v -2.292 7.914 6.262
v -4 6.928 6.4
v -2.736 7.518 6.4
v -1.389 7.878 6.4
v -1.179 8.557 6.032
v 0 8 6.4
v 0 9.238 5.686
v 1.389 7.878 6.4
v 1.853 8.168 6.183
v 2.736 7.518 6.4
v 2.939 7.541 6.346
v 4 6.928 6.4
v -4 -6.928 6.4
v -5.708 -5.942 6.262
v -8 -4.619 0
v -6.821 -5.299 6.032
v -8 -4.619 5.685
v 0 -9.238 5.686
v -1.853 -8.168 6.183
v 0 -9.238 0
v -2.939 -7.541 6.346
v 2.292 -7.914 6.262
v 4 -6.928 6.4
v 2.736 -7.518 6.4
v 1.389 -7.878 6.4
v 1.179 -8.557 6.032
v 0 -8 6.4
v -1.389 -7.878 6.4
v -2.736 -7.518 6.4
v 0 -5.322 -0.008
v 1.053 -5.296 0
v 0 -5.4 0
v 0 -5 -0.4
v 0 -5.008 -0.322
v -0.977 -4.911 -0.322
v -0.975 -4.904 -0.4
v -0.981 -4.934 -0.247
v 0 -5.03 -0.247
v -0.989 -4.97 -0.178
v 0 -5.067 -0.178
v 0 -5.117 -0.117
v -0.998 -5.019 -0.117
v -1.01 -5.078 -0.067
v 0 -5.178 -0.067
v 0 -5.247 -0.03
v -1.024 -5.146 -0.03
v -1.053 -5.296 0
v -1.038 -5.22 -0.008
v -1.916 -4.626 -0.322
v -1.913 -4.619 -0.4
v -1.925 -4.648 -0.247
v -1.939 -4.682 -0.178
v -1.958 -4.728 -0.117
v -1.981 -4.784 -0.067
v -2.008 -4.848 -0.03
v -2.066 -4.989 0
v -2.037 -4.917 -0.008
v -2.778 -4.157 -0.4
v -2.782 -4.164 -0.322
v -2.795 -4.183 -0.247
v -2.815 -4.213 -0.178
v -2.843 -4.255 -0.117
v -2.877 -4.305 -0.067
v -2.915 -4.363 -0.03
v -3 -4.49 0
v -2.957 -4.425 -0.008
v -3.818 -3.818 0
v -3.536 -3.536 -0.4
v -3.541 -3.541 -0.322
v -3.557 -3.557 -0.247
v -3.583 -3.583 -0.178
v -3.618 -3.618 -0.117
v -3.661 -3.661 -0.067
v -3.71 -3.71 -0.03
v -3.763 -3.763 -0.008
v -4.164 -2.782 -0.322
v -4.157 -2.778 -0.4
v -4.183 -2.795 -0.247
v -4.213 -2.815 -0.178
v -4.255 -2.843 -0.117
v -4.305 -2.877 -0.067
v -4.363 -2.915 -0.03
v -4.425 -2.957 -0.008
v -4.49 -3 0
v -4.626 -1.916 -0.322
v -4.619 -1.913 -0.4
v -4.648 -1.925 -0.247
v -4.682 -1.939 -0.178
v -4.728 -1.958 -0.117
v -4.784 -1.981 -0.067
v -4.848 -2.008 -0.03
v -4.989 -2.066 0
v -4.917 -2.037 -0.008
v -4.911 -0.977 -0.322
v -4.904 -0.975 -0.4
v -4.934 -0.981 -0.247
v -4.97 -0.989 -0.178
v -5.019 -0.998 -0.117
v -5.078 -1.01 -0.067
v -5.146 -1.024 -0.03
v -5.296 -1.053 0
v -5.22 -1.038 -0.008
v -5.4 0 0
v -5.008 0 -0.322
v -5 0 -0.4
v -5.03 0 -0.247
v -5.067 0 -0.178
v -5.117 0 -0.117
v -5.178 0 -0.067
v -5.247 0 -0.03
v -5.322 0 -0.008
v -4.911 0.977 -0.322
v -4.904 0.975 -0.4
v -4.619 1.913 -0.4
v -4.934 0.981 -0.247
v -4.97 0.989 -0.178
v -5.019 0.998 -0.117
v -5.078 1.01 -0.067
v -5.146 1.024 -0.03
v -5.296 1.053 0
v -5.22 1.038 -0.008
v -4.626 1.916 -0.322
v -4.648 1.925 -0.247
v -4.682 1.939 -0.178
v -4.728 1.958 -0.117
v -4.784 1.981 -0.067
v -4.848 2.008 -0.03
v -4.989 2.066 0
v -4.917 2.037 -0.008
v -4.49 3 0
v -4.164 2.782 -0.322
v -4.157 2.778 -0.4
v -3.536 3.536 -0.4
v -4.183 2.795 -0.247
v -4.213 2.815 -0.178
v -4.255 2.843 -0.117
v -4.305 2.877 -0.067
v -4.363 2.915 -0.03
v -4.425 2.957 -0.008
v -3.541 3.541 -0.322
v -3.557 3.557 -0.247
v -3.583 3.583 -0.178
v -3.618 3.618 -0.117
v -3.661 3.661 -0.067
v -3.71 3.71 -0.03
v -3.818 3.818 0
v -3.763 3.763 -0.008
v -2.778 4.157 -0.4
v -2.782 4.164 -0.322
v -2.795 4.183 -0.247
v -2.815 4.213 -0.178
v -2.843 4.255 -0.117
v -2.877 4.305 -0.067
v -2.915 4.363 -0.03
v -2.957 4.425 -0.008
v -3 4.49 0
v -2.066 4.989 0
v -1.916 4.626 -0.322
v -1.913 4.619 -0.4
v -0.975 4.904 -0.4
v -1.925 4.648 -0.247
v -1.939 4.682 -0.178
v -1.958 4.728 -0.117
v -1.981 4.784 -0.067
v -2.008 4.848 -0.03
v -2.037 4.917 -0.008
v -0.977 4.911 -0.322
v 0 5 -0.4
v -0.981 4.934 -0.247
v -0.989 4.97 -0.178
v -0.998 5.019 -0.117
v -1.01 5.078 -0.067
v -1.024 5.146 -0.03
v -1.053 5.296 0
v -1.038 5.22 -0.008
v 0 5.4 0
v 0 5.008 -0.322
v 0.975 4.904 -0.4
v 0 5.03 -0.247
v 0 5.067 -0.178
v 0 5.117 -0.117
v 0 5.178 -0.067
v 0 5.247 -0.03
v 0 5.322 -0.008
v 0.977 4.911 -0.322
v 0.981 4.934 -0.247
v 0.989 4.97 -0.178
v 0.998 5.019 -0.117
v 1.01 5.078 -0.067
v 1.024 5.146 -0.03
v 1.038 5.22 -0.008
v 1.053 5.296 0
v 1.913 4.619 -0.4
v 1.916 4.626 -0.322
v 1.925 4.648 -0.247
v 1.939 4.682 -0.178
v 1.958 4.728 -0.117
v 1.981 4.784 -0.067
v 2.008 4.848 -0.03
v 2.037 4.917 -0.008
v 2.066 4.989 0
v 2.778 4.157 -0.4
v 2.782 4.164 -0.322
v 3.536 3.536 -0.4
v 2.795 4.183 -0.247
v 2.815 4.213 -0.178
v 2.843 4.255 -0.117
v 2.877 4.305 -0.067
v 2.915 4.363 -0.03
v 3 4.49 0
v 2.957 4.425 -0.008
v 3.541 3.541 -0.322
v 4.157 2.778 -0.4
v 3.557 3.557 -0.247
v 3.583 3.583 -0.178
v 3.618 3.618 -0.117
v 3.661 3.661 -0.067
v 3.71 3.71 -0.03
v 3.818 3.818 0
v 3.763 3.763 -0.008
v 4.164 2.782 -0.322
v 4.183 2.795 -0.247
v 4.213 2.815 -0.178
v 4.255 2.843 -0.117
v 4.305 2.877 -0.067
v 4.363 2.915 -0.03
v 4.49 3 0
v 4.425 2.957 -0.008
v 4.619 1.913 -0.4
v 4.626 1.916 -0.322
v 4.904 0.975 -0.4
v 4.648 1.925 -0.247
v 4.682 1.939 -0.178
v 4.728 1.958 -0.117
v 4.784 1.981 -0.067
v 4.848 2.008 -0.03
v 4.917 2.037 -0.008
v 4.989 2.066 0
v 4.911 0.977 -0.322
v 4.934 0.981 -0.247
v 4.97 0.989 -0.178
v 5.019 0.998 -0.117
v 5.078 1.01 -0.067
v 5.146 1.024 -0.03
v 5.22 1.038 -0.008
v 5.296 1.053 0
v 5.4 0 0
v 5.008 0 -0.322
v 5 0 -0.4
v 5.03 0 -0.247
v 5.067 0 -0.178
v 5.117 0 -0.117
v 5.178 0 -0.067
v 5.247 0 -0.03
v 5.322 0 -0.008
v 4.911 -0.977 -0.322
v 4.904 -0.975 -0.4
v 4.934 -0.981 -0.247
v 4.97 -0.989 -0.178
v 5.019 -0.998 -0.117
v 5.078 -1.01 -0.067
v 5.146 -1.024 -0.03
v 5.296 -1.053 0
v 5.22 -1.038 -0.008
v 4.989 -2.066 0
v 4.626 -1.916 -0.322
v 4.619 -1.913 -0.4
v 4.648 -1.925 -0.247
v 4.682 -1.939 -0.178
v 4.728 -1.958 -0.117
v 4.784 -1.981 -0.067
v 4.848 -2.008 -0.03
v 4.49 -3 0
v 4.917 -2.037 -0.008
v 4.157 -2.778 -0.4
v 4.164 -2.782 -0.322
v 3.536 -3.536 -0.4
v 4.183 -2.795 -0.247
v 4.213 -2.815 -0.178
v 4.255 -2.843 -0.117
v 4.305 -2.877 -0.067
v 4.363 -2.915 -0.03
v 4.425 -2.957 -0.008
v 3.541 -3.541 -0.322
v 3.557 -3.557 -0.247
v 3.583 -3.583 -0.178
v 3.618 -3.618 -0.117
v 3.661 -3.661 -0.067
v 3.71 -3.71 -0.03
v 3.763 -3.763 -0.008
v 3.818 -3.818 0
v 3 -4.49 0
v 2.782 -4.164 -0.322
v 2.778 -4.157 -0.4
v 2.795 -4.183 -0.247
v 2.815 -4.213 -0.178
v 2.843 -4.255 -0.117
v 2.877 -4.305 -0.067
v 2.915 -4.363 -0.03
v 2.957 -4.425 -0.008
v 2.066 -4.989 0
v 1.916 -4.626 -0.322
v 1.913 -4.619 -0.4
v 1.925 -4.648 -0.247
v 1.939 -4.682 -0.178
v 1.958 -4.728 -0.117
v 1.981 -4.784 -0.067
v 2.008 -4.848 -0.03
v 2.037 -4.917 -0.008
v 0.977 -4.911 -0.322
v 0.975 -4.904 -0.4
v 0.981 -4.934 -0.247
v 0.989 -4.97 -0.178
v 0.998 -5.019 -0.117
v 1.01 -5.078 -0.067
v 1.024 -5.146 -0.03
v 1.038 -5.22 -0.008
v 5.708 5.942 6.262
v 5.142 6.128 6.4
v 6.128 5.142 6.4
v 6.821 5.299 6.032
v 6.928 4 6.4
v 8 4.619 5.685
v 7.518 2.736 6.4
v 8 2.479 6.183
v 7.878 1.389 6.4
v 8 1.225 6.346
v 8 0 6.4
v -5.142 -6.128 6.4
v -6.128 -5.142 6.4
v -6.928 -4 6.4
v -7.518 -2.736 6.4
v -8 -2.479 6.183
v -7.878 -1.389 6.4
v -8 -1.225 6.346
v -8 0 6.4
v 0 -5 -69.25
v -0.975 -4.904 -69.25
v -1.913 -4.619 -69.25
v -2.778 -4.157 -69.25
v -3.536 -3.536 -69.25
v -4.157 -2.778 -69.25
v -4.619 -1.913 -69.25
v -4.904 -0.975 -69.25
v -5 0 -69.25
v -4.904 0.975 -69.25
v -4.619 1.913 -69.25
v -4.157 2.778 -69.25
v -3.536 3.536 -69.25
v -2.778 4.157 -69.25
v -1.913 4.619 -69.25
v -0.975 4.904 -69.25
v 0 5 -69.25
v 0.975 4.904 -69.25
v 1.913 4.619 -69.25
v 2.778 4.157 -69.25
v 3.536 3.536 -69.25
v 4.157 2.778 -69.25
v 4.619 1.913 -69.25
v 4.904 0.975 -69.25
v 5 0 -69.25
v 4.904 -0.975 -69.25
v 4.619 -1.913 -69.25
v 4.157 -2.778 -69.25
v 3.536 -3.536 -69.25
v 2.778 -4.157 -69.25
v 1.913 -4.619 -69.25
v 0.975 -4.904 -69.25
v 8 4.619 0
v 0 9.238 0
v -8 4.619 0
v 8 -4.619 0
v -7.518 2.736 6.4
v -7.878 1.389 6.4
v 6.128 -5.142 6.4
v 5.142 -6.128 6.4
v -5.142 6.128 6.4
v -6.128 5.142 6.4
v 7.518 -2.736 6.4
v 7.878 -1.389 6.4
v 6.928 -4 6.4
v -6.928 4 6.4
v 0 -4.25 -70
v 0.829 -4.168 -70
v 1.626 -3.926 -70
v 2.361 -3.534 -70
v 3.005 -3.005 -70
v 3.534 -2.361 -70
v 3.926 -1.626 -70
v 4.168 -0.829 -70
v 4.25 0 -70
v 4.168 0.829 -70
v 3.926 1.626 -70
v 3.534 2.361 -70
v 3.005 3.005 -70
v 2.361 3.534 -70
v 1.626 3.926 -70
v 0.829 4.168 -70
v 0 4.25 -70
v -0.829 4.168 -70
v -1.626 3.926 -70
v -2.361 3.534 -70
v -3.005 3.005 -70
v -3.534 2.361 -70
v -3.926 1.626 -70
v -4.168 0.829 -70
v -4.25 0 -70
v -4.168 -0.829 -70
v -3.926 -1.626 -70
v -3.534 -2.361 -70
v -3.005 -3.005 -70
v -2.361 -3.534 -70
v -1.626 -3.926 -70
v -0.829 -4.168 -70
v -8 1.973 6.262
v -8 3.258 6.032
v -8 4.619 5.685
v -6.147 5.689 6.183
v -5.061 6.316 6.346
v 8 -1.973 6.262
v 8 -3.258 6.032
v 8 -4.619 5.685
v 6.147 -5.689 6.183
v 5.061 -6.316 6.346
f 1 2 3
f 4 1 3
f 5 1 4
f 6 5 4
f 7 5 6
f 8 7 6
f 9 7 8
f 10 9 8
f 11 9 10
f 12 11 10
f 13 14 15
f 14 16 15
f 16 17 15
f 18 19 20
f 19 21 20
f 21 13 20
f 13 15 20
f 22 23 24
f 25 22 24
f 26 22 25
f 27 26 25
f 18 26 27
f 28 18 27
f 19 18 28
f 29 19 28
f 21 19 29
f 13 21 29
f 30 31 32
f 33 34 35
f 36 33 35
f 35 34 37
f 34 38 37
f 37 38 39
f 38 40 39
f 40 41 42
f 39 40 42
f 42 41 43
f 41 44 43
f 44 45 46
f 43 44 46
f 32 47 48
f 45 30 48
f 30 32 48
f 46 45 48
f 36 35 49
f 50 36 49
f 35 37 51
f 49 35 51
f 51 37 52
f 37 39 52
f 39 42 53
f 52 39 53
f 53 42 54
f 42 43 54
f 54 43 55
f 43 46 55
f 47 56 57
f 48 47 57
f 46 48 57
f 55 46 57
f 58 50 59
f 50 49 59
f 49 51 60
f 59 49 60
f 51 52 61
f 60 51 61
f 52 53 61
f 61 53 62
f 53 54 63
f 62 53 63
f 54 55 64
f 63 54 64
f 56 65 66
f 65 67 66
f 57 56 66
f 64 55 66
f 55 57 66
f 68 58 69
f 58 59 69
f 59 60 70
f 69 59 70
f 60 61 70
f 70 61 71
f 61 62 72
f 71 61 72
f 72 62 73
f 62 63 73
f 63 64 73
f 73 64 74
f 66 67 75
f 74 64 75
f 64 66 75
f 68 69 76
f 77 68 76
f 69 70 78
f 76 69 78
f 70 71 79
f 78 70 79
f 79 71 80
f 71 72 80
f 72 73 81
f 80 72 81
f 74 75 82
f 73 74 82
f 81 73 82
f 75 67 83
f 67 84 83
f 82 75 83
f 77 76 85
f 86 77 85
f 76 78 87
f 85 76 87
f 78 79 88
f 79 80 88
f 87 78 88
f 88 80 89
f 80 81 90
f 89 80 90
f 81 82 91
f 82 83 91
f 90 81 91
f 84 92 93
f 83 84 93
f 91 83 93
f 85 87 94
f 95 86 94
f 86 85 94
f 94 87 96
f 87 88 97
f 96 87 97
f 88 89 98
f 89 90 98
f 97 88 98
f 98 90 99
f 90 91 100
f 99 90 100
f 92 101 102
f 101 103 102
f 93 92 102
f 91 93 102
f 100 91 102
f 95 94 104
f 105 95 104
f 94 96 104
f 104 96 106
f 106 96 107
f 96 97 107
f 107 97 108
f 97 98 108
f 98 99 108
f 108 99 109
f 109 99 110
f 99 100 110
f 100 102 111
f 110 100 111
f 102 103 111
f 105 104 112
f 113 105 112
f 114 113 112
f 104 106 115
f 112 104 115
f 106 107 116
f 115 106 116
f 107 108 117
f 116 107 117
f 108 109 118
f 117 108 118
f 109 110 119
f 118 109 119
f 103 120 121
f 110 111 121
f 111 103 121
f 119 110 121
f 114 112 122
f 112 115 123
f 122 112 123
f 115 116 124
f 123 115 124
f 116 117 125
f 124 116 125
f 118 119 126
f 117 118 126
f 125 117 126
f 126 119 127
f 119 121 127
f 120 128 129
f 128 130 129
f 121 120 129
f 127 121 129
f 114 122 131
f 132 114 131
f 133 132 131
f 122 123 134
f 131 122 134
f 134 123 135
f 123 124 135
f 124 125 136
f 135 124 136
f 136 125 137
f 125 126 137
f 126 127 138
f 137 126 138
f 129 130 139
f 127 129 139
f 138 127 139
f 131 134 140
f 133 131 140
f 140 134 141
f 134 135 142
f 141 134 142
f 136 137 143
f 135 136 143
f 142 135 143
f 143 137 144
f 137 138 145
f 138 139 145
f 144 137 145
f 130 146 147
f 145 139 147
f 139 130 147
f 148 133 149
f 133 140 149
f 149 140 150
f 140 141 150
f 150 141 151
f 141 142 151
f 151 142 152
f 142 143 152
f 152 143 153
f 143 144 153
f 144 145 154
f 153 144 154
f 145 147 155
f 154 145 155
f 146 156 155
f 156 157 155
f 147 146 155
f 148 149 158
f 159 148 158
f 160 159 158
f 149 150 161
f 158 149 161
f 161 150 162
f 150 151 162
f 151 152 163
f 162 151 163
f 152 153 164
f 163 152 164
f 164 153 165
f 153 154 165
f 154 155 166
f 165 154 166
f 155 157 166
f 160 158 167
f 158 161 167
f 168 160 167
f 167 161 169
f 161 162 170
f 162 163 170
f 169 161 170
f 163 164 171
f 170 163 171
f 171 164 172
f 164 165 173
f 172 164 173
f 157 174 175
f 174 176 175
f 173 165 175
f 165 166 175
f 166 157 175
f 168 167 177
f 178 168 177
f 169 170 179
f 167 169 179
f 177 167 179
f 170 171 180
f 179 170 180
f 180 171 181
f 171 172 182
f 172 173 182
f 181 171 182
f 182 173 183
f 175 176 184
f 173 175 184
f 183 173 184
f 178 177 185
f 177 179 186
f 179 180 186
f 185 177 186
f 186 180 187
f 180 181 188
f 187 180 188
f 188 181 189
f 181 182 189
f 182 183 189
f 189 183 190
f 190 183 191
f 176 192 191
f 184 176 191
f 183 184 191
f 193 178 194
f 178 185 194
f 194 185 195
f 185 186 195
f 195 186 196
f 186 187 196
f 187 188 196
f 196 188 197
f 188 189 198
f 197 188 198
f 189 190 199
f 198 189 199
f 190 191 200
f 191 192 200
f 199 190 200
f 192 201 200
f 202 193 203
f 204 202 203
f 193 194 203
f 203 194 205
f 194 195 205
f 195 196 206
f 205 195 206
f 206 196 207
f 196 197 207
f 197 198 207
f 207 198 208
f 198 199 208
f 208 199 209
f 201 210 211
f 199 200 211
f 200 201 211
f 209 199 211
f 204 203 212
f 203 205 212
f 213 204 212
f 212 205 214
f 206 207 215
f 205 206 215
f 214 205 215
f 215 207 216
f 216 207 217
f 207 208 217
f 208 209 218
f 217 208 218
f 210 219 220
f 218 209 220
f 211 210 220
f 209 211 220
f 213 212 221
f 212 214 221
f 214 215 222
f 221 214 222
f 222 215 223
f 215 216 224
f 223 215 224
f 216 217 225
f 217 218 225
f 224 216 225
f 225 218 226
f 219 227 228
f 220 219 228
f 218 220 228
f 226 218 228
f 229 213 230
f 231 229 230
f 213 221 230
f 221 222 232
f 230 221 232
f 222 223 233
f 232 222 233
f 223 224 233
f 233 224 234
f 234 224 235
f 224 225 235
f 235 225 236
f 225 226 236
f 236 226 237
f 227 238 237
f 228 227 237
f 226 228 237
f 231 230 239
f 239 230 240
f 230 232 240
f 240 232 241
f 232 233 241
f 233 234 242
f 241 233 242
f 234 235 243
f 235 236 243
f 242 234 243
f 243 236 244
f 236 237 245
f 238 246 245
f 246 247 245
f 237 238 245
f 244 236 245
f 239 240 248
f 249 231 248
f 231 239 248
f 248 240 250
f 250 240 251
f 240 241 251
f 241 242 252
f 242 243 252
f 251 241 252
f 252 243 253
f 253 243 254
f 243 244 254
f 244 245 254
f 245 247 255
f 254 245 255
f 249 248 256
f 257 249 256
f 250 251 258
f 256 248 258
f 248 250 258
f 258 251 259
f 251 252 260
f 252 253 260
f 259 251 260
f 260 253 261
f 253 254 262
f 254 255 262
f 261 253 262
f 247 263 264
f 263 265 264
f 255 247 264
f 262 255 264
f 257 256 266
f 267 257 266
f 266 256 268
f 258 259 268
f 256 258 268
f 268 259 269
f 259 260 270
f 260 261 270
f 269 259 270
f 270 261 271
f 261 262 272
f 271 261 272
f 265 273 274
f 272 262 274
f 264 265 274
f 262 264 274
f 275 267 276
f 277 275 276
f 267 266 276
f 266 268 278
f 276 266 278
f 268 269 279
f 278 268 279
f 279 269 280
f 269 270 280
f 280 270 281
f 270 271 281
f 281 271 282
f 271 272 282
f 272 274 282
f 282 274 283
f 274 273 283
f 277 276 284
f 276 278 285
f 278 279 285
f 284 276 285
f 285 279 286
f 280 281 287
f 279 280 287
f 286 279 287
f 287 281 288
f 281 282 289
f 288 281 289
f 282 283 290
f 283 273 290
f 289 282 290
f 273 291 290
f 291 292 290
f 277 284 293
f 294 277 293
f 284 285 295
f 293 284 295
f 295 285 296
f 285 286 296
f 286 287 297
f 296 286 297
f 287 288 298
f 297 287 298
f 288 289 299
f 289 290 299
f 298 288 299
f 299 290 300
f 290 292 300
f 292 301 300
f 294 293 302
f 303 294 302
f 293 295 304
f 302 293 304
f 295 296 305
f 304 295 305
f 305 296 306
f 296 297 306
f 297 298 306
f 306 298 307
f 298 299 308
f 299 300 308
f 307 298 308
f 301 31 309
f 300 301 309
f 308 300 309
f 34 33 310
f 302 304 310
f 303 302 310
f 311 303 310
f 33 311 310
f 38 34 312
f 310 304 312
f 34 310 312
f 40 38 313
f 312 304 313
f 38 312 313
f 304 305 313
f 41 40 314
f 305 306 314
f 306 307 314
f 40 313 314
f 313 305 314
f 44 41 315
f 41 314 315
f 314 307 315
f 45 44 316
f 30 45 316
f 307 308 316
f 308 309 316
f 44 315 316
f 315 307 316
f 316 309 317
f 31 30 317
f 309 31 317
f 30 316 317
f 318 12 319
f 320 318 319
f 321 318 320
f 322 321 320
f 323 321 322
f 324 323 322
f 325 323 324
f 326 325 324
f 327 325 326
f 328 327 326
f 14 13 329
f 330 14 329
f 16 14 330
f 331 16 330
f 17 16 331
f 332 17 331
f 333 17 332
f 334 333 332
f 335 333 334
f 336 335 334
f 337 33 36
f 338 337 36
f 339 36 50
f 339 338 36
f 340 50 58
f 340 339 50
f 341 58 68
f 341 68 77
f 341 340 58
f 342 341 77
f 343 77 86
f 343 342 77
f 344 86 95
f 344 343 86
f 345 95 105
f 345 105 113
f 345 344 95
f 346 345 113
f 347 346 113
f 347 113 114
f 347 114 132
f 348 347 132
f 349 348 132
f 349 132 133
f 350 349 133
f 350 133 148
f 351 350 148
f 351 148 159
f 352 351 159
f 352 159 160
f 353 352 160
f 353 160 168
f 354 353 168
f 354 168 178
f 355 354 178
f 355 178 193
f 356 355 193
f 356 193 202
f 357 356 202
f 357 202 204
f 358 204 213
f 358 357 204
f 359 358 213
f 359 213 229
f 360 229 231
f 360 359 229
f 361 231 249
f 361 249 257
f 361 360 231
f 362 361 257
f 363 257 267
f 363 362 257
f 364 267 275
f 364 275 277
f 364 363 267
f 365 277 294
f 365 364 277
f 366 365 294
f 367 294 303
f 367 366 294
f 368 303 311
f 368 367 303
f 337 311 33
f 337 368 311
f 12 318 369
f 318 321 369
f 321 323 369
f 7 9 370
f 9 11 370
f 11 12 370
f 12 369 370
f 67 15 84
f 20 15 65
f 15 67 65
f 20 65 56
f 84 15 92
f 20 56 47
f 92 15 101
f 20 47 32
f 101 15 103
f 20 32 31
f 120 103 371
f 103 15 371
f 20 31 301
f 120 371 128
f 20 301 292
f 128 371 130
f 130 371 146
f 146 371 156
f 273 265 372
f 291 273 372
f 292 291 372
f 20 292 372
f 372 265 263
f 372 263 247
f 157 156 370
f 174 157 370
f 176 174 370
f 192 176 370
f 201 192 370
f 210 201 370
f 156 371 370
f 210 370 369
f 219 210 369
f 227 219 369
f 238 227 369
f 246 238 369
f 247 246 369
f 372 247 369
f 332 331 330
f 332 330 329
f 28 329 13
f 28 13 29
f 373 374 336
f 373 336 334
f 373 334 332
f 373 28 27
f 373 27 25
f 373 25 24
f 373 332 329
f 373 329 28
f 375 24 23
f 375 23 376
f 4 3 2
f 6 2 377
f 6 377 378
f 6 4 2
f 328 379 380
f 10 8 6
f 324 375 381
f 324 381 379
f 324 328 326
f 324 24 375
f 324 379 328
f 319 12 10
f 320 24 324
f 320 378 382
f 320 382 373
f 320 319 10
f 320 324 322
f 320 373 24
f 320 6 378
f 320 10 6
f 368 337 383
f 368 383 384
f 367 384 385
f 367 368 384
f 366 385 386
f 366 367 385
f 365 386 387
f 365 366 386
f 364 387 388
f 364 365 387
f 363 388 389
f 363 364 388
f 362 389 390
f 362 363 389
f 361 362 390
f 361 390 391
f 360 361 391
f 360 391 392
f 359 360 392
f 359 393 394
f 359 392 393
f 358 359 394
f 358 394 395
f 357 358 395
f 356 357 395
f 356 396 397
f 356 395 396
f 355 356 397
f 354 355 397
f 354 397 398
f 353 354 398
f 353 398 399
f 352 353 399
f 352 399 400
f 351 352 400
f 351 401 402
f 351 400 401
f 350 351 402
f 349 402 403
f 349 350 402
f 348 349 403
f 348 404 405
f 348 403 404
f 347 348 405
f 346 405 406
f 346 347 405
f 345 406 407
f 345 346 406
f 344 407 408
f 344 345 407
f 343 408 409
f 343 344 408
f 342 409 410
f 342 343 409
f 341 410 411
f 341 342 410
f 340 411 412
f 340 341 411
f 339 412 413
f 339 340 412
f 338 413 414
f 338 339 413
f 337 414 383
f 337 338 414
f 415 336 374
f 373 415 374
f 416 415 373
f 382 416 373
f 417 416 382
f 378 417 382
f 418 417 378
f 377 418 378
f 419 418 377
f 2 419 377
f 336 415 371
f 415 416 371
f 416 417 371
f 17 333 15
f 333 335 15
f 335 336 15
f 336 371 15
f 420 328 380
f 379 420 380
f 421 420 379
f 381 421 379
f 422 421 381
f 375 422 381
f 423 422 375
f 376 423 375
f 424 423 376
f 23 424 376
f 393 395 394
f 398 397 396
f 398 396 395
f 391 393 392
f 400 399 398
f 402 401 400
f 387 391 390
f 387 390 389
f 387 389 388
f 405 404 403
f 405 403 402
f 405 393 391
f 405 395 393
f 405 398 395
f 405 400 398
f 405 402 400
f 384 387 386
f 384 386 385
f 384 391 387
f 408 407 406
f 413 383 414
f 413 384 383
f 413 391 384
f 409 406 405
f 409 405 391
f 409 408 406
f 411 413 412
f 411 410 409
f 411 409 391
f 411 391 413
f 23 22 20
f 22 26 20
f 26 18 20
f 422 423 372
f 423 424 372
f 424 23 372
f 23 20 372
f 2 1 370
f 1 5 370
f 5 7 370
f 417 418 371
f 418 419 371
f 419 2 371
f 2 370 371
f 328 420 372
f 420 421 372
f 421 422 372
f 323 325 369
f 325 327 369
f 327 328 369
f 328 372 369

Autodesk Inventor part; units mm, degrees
ref_plane "WorkPlane1" through (0, 0, 0) normal (0, 0, 1) x (1, 0, 0)
sketch "Sketch1" plane through (0, 0, 0) normal (0, 0, 1) x (1, 0, 0)
  point P0 (0, 0)
sketch "Sketch2" plane through (0, 0, 0) normal (0, 0, 1) x (1, 0, 0)
  line L0 (-8, 4.6189) -> (-8, -4.6189)
  line L1 (0, 9.2375) -> (-8, 4.6189)
  line L2 (8, 4.6189) -> (0, 9.2375)
  line L3 (8, -4.6189) -> (8, 4.6189)
  line L4 (0, -9.2375) -> (8, -4.6189)
  line L5 (-8, -4.6189) -> (0, -9.2375)
  circle A0 centre (0, 0) radius 8 construction
  dimension "d1" = 16
  dimension "d29" = 0
  dimension "d30" = 0
extrude "Extrusion1" add sketch "Sketch2" along normal blind 6.4
sketch "Sketch3" plane through (0, 0, 0) normal (1, 0, 0) x (0, 1, 0)
  line L0 (8, 6.4) -> (9.3375, 6.4)
  line L1 (9.3375, 5.6278) -> (8, 6.4)
  line L2 (9.3375, 6.4) -> (9.3375, 5.6278)
  line L3 (0, -1.28) -> (0, 7.68) projected
  line L4 (9.2375, 0) -> (9.2375, 6.4) projected
  dimension "d25" = 0.1
  dimension "d26" = 0
  dimension "d27" = 60
  dimension "d28" = 8
revolve "Revolution1" cut sketch "Sketch3" angle 360 about axis through (0, 0, -10) along (0, 0, 1)
sketch "Sketch4" plane through (0, 0, 0) normal (1, 0, 0) x (0, 1, 0)
  line L0 (0, -70) -> (0, 0)
  line L1 (-5, -70) -> (0, -70)
  line L2 (-5, 0) -> (-5, -70)
  line L3 (0, 0) -> (-5, 0)
  line L4 (0, -70) -> (0, 0)
  line L5 (-6, 0) -> (1, 0) projected
  line L6 (0, -84) -> (0, 14) projected
  dimension "d18" = 5
  dimension "d20" = 70
  dimension "d33" = 0
  dimension "d34" = 0
revolve "Revolution2" add sketch "Sketch4" angle 360 about axis through (0, 0, -70) along (0, 0, -1)
chamfer "Chamfer1" distance 0.75 angle 45 1 edges at (0, 5, -70)
fillet "Fillet1" radius 0.4 1 edges at (0, 5, 0)
thread "Thread1" size "M10x1.5" class "6g" standard "ISO Metric profile" length 67
ref_plane "MSC_PF1" through (0, 0, 0) normal (1, 0, 0) x (0, 1, 0)
ref_plane "MSC_PT1" through (0, 0, 0) normal (0, 0, -1) x (-1, 0, 0)
equation "\"d22\" = 0.5 * PTC"
equation "\"d23\" = 0.5 * PTC"
equation "\"d24\" = r"
equation "\"d1\" = ParS"
equation "\"d6\" = ParK"
equation "\"b\" = NLG - 2 * PTC"
equation "\"d28\" = 0.5 * ParS"
equation "\"d18\" = 0.5 * NND"
equation "\"d20\" = NLG"
equation "\"NLG\" = 70"
equation "\"PTC\" = 1.5"
equation "\"ParK\" = 6.4"
equation "\"ParS\" = 16"
equation "\"msp_es\" = 0.577367 * ParS"
equation "\"r\" = 0.4"
equation "\"K1\" = 4.17"
equation "\"NND\" = 10"
properties part number "DIN EN ISO 4018 - M10x70" material "Stainless Steel"
